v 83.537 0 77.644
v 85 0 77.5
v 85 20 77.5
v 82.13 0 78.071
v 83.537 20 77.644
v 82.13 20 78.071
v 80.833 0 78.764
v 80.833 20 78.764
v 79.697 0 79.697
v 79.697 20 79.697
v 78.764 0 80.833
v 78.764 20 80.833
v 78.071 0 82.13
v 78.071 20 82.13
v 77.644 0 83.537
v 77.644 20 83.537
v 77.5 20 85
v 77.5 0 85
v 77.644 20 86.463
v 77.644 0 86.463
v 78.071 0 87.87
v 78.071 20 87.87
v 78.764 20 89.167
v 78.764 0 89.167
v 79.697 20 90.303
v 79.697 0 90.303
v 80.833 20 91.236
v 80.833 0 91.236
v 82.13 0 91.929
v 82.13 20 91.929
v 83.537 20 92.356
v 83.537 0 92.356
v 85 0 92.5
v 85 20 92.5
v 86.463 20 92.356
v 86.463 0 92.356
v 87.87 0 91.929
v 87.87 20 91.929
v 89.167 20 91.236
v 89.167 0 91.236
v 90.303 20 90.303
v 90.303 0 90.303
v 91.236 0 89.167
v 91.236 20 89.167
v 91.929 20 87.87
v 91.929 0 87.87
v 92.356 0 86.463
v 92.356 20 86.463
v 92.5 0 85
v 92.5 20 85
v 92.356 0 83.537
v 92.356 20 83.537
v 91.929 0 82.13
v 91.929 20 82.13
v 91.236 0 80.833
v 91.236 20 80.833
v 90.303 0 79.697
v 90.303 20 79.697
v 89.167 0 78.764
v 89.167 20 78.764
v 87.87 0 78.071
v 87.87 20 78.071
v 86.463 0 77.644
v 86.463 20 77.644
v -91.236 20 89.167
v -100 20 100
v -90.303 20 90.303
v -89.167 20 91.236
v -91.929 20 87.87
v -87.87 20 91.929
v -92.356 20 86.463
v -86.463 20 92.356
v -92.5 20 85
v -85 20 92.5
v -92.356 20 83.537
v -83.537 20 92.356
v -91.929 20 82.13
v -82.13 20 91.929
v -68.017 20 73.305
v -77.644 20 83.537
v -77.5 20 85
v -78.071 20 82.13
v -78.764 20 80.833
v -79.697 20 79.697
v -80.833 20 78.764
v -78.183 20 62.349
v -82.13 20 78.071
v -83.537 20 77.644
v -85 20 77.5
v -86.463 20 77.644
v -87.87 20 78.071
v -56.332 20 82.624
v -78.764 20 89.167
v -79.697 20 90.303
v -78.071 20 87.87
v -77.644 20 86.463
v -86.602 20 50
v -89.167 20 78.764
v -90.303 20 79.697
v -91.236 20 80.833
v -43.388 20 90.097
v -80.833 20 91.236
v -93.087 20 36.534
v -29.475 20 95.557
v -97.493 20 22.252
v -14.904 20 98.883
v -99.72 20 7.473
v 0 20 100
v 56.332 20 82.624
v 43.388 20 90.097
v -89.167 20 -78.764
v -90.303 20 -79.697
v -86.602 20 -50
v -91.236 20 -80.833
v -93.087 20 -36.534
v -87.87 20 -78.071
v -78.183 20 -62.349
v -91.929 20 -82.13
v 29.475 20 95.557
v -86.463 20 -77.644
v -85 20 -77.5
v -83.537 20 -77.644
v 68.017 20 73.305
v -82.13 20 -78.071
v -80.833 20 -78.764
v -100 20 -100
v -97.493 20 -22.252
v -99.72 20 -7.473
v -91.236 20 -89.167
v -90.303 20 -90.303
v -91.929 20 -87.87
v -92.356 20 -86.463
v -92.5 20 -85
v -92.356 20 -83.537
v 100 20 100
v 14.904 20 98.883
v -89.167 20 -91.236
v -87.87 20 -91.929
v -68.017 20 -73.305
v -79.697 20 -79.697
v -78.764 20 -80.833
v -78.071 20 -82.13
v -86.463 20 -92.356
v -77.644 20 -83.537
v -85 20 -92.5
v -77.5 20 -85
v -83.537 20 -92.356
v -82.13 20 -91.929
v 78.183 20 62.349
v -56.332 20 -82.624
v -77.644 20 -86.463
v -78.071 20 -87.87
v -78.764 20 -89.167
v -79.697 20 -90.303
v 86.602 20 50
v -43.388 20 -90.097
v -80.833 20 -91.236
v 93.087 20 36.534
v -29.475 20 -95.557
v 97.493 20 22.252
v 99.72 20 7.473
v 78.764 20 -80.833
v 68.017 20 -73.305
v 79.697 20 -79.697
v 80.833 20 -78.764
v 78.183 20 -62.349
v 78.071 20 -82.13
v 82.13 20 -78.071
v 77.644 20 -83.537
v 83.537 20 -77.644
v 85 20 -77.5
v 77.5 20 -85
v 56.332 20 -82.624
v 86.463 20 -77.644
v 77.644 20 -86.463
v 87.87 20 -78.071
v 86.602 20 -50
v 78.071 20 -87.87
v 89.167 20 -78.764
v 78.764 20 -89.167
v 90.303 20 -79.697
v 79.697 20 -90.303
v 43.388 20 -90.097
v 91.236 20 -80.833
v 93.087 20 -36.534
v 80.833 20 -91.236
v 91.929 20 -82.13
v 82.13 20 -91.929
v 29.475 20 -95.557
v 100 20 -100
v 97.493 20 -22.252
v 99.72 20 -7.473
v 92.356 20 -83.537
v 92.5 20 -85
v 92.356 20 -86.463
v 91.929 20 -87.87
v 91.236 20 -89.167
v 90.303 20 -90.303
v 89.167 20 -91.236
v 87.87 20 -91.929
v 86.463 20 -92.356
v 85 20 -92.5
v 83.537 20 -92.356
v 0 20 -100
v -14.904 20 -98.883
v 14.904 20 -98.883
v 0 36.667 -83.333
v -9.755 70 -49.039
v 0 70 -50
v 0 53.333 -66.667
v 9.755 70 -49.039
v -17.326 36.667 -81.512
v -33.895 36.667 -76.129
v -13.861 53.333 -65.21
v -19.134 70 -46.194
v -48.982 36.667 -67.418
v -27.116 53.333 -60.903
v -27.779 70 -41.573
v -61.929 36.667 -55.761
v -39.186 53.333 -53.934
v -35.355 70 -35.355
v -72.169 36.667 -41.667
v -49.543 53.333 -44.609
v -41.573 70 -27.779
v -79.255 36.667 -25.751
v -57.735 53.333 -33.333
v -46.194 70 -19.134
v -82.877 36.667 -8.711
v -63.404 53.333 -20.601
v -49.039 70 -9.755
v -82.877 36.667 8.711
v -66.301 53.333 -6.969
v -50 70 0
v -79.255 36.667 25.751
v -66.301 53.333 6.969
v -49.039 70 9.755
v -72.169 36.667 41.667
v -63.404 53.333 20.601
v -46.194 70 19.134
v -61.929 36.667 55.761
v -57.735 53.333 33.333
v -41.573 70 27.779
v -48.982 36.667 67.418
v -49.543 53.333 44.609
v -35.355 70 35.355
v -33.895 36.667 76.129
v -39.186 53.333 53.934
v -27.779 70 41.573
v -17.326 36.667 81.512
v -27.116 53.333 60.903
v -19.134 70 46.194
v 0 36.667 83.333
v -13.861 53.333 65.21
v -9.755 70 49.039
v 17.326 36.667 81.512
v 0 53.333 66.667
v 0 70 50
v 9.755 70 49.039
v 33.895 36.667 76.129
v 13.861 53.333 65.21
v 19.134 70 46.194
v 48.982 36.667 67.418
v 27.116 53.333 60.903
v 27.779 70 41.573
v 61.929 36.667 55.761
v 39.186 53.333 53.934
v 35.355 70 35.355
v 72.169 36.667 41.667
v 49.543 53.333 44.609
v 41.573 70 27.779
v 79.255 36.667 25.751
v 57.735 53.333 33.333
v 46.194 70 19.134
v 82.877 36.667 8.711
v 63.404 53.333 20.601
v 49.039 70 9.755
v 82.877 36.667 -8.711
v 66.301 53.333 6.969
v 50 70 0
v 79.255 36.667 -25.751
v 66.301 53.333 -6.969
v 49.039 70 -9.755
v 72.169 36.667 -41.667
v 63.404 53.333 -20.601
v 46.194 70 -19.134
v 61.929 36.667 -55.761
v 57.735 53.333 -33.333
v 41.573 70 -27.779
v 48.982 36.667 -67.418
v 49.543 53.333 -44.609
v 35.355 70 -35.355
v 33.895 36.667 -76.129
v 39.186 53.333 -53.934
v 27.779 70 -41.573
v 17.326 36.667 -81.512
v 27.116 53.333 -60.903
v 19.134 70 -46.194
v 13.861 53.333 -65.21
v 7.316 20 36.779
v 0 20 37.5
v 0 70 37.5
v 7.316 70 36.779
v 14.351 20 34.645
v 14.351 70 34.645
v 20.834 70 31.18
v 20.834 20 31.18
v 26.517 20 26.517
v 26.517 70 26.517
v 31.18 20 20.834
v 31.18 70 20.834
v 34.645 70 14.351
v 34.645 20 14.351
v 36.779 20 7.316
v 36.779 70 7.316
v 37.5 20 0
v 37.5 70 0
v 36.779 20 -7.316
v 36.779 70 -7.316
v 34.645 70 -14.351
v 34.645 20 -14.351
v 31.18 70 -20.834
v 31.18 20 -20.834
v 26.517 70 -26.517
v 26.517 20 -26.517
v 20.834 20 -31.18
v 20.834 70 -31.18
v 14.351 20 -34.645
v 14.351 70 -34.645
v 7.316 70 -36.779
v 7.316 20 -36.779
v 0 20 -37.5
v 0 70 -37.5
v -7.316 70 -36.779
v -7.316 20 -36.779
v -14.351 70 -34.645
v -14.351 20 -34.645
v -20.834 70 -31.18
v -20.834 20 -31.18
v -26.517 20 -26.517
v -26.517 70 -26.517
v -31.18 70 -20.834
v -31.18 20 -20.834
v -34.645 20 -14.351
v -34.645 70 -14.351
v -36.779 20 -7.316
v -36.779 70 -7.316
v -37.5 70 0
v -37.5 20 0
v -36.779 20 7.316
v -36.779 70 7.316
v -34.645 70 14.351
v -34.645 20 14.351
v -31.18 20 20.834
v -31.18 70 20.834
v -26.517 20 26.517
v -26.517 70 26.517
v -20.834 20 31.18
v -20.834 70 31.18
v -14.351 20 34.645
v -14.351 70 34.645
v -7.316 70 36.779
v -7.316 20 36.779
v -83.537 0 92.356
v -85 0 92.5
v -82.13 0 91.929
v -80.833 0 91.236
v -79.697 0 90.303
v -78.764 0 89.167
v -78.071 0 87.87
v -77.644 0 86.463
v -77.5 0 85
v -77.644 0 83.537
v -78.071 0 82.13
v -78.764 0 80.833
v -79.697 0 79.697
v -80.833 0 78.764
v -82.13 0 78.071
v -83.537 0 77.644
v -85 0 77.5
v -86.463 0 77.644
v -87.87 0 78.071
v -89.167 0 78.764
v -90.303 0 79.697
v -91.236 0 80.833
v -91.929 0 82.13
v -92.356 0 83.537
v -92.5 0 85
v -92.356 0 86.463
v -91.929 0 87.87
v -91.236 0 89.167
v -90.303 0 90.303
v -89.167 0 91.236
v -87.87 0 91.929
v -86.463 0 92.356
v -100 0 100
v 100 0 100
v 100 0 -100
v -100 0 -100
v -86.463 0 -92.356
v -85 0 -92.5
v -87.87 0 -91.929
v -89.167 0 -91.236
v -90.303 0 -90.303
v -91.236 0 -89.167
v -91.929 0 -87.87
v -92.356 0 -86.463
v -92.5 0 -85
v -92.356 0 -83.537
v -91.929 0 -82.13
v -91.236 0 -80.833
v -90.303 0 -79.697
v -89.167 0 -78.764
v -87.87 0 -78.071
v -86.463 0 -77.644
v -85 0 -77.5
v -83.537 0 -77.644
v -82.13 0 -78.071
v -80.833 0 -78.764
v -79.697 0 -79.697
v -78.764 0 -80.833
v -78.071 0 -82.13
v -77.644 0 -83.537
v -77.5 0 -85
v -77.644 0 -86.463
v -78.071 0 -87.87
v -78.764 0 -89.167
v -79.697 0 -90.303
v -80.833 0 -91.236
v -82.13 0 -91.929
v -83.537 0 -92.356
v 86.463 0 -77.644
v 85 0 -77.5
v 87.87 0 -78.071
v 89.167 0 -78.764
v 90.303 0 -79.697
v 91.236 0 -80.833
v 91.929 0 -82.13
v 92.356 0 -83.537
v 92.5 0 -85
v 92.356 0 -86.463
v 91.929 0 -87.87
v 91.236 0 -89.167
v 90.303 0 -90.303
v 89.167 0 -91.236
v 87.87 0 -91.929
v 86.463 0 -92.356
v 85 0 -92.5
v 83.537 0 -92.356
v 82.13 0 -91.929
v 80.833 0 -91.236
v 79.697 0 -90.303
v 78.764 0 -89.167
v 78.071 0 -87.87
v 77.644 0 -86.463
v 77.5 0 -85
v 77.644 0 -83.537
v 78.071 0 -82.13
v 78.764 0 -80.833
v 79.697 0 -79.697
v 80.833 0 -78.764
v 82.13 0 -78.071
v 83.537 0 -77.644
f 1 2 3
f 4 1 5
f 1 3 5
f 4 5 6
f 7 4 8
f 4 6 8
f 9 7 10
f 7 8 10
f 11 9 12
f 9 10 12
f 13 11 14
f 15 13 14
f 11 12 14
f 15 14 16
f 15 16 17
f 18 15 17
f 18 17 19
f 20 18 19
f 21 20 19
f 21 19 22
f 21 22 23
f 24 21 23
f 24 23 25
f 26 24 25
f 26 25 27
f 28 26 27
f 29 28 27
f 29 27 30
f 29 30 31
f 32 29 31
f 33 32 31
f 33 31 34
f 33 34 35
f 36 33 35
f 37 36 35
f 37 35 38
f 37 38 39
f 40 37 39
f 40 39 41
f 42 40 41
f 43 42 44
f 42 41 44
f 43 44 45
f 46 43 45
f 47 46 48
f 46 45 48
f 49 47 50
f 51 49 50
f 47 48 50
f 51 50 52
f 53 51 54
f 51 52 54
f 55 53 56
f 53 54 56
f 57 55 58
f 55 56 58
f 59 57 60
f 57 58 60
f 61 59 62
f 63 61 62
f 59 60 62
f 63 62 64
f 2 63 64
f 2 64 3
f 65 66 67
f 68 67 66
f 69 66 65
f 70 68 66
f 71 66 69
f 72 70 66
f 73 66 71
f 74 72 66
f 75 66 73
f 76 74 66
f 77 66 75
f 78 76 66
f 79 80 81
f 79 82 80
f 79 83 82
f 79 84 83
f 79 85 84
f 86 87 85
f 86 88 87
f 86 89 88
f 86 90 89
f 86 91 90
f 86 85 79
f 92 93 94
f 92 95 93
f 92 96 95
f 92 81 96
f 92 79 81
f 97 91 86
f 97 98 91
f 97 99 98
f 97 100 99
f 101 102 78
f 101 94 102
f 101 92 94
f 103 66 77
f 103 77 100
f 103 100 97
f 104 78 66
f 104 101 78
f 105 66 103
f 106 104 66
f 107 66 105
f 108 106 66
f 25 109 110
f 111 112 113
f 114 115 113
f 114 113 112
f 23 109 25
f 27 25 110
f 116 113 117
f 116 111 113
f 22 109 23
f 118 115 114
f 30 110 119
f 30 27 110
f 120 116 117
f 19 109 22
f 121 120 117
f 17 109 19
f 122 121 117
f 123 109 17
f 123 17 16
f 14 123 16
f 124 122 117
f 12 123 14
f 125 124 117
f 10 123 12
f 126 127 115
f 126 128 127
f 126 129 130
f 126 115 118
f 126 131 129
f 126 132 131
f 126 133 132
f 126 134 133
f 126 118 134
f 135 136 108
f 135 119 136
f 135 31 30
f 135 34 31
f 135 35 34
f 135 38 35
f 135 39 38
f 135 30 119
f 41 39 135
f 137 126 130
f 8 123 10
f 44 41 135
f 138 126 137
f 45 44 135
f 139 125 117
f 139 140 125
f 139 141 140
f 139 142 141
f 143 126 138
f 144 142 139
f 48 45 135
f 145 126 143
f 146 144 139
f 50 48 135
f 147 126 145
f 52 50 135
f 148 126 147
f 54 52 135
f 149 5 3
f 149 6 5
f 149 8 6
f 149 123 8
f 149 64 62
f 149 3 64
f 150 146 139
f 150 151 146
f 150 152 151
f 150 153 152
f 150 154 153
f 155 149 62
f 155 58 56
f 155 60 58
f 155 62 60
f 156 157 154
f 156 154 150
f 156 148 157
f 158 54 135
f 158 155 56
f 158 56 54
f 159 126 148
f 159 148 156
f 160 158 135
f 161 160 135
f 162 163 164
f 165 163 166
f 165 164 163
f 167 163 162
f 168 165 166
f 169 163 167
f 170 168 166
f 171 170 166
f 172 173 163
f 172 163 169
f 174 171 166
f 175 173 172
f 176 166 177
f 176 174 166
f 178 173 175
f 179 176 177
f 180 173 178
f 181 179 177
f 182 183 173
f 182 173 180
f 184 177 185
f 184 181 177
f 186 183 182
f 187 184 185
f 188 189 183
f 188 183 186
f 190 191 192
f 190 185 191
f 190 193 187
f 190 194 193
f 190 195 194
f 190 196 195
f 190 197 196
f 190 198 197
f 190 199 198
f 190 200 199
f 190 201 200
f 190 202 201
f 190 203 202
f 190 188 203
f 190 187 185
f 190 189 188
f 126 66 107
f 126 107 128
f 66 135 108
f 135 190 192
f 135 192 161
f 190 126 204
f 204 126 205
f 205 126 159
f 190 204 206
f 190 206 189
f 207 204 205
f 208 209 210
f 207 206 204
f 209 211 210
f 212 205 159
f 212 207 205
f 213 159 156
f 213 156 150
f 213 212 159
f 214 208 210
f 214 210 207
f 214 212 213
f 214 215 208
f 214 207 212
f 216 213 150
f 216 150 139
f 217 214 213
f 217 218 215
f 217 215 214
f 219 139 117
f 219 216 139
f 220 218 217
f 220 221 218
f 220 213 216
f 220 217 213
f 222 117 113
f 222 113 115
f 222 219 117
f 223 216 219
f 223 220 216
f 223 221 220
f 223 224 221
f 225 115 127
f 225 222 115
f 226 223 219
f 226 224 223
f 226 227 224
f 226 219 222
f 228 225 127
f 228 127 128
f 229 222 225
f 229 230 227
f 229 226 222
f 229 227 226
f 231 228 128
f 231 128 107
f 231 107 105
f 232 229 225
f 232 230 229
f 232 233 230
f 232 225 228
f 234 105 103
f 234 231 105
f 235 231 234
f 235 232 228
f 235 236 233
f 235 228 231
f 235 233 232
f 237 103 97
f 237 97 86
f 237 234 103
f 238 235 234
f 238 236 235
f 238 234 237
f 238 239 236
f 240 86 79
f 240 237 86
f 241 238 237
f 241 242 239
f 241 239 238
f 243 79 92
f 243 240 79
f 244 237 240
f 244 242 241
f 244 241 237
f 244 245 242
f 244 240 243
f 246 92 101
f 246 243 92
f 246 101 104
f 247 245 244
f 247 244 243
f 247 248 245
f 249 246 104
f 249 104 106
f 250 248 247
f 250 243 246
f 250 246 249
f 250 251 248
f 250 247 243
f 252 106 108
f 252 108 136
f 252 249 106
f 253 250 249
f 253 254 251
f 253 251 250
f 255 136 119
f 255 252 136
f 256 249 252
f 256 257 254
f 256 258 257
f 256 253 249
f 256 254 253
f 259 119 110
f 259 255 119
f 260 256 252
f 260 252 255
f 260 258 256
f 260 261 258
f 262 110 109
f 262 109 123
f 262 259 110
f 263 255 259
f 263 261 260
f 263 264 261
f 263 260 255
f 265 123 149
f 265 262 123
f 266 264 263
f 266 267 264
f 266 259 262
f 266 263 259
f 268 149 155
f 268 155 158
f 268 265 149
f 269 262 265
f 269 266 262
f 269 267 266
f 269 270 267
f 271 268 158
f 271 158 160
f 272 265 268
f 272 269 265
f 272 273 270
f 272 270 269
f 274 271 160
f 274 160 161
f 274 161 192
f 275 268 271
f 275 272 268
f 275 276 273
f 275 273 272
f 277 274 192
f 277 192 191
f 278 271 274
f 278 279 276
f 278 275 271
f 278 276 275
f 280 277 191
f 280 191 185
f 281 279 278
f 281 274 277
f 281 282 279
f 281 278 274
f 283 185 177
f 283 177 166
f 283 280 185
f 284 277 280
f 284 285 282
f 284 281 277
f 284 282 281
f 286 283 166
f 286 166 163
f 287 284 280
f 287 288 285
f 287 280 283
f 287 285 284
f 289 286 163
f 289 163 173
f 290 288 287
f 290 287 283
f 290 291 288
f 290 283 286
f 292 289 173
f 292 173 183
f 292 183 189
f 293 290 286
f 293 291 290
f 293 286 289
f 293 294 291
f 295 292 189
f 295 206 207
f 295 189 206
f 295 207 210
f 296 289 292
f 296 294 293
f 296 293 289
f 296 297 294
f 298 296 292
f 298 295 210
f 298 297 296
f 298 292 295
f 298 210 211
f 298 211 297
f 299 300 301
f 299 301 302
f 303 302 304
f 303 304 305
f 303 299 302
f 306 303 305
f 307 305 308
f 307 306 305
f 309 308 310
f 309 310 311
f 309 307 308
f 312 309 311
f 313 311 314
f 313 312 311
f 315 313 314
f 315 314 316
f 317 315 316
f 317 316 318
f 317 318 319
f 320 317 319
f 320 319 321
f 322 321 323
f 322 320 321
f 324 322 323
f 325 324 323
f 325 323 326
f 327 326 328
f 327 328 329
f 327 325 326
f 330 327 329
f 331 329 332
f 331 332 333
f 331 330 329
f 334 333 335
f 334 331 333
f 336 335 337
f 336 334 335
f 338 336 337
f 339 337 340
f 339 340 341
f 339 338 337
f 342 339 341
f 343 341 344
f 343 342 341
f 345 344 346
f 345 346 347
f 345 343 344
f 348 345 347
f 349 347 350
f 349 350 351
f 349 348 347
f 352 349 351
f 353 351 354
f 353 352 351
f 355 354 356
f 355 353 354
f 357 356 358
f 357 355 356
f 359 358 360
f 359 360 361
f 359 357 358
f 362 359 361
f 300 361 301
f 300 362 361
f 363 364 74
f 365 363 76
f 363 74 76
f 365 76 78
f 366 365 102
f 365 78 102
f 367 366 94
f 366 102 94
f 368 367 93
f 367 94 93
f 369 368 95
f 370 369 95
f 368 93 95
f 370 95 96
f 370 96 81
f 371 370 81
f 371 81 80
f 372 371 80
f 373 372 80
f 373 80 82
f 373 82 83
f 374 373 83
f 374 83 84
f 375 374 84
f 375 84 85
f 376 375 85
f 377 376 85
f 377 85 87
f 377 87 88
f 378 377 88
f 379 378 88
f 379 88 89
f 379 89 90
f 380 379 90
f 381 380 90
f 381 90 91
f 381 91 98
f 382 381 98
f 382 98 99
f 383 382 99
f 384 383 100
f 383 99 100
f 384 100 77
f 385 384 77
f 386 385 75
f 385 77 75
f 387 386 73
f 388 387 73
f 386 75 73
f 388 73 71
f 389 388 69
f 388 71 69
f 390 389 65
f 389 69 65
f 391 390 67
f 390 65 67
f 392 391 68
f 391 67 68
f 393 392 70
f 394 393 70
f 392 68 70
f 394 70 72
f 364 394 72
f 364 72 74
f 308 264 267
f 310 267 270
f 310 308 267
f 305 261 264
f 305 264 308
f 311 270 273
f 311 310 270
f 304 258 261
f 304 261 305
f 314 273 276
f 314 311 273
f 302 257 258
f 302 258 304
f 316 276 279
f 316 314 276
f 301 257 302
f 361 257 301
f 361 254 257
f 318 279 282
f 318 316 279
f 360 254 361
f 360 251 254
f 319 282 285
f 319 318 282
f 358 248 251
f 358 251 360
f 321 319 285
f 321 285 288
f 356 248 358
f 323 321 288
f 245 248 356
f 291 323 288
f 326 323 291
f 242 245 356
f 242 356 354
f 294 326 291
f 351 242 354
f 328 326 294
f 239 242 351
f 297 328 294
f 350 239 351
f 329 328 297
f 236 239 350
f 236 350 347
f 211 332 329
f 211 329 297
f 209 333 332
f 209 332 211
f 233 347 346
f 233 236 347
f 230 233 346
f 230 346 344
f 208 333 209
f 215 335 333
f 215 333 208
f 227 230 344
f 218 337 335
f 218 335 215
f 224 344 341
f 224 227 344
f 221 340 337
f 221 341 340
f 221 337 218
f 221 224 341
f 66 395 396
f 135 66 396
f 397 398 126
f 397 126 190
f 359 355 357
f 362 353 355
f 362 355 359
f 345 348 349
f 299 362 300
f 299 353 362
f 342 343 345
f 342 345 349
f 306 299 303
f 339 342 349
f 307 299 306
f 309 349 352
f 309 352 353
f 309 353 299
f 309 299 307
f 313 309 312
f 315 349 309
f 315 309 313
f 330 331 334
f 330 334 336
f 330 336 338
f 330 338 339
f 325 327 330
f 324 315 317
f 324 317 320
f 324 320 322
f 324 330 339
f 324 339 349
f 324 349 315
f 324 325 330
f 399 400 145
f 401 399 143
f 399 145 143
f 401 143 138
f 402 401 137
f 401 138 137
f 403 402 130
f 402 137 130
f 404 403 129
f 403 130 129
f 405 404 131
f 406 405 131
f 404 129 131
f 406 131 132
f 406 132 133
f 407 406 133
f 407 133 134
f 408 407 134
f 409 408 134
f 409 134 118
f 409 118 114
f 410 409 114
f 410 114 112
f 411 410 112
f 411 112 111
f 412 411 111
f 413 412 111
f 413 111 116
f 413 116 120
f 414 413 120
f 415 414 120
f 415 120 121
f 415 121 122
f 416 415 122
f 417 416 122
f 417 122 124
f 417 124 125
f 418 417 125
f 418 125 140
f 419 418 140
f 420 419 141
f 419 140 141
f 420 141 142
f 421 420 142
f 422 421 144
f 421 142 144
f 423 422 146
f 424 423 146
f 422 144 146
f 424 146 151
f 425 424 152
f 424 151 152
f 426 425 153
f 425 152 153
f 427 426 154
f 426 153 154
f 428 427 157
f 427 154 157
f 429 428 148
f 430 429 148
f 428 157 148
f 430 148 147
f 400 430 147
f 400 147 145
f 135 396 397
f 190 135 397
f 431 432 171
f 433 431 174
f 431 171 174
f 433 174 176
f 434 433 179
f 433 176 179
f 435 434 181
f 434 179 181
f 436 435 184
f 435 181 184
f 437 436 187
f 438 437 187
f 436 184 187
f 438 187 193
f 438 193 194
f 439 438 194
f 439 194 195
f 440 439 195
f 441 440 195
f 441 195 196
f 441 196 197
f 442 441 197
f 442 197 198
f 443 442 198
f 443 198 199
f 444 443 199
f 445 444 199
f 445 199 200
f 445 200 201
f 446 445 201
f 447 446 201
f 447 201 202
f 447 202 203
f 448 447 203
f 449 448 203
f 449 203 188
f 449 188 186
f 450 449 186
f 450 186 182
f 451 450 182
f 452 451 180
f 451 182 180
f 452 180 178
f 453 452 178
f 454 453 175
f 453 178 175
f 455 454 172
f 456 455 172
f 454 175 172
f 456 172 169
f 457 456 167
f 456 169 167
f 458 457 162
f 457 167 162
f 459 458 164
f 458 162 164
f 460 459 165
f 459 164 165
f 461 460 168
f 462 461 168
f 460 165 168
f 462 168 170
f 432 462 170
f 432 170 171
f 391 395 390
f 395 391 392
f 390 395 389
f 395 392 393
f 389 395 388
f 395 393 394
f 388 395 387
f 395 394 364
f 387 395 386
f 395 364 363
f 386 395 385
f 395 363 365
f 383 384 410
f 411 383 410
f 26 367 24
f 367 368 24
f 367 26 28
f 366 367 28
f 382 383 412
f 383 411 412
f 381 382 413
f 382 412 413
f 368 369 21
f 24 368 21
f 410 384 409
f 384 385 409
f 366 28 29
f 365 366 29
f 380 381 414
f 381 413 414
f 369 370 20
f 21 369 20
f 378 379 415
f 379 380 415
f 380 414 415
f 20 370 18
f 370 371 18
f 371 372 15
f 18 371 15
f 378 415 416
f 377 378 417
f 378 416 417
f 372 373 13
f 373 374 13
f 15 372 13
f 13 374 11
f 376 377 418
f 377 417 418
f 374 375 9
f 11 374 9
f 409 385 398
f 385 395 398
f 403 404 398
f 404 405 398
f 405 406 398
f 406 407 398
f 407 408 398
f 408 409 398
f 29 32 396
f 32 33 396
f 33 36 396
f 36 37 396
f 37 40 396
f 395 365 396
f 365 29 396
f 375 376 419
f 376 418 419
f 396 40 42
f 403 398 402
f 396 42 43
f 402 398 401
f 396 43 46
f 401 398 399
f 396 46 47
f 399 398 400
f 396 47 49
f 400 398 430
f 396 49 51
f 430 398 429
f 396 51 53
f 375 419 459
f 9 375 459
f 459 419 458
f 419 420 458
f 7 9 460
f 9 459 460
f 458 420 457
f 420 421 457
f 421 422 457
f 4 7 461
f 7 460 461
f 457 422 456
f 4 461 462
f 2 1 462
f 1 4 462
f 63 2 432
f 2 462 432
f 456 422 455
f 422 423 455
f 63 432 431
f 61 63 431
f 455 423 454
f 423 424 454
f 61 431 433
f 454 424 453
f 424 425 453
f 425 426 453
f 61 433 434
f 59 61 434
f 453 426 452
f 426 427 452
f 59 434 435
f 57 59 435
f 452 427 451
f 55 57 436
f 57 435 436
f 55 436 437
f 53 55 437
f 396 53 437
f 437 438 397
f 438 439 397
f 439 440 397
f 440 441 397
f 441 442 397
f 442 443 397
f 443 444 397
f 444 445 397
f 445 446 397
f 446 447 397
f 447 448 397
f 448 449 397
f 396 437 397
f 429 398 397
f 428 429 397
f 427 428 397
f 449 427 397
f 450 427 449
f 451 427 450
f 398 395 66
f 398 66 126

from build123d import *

# Parameters (mm, degrees)
SKIZZE1_W                       = 200
SKIZZE1_H                       = 200
AUFSATZ_LINEAR_AUSTRAGEN1_DEPTH = 20
SKIZZE2_R                       = 50
SKIZZE2_R_2                     = 37.5
AUFSATZ_LINEAR_AUSTRAGEN2_DEPTH = 50
FASE1_SIZE                      = 50
SKIZZE3_R                       = 7.5
SCHNITT_LINEAR_AUSTRAGEN1_DEPTH = 50


with BuildPart() as part:
    # Skizze1 → Aufsatz-Linear austragen1 (new body)
    with BuildSketch(Plane(origin=(0, 0, 0), x_dir=(1, 0, 0), z_dir=(0, 1, 0))):
        Rectangle(SKIZZE1_W, SKIZZE1_H)
    extrude(amount=AUFSATZ_LINEAR_AUSTRAGEN1_DEPTH)

    # Skizze2 → Aufsatz-Linear austragen2 (add)
    with BuildSketch(Plane(origin=(0, 20, 0), x_dir=(1, 0, 0), z_dir=(0, 1, 0))):
        with Locations(Location((0, 0, 0), (0, 0, 90))):
            Circle(SKIZZE2_R)
        with Locations(Location((0, 0, 0), (0, 0, 270))):
            Circle(SKIZZE2_R_2, mode=Mode.SUBTRACT)
    extrude(amount=AUFSATZ_LINEAR_AUSTRAGEN2_DEPTH)

    # Fase1
    fase1_edges = [part.edges().sort_by_distance(p)[0] for p in [
        (0, 20, 50),
    ]]
    chamfer(fase1_edges, length=FASE1_SIZE - 0.0001)  # a hair under: the kernel refuses the full size

    # Skizze3 → Schnitt-Linear austragen1 (cut)
    with BuildSketch(Plane(origin=(0, 20, 0), x_dir=(1, 0, 0), z_dir=(0, 1, 0))):
        with Locations(Location((85, 85, 0), (0, 0, 270))):
            Circle(SKIZZE3_R)
        with Locations(Location((-85, 85, 0), (0, 0, 90))):
            Circle(SKIZZE3_R)
        with Locations(Location((85, -85, 0), (0, 0, 90))):
            Circle(SKIZZE3_R)
        with Locations(Location((-85, -85, 0), (0, 0, 270))):
            Circle(SKIZZE3_R)
    extrude(amount=-SCHNITT_LINEAR_AUSTRAGEN1_DEPTH, mode=Mode.SUBTRACT)


solid = part.part
